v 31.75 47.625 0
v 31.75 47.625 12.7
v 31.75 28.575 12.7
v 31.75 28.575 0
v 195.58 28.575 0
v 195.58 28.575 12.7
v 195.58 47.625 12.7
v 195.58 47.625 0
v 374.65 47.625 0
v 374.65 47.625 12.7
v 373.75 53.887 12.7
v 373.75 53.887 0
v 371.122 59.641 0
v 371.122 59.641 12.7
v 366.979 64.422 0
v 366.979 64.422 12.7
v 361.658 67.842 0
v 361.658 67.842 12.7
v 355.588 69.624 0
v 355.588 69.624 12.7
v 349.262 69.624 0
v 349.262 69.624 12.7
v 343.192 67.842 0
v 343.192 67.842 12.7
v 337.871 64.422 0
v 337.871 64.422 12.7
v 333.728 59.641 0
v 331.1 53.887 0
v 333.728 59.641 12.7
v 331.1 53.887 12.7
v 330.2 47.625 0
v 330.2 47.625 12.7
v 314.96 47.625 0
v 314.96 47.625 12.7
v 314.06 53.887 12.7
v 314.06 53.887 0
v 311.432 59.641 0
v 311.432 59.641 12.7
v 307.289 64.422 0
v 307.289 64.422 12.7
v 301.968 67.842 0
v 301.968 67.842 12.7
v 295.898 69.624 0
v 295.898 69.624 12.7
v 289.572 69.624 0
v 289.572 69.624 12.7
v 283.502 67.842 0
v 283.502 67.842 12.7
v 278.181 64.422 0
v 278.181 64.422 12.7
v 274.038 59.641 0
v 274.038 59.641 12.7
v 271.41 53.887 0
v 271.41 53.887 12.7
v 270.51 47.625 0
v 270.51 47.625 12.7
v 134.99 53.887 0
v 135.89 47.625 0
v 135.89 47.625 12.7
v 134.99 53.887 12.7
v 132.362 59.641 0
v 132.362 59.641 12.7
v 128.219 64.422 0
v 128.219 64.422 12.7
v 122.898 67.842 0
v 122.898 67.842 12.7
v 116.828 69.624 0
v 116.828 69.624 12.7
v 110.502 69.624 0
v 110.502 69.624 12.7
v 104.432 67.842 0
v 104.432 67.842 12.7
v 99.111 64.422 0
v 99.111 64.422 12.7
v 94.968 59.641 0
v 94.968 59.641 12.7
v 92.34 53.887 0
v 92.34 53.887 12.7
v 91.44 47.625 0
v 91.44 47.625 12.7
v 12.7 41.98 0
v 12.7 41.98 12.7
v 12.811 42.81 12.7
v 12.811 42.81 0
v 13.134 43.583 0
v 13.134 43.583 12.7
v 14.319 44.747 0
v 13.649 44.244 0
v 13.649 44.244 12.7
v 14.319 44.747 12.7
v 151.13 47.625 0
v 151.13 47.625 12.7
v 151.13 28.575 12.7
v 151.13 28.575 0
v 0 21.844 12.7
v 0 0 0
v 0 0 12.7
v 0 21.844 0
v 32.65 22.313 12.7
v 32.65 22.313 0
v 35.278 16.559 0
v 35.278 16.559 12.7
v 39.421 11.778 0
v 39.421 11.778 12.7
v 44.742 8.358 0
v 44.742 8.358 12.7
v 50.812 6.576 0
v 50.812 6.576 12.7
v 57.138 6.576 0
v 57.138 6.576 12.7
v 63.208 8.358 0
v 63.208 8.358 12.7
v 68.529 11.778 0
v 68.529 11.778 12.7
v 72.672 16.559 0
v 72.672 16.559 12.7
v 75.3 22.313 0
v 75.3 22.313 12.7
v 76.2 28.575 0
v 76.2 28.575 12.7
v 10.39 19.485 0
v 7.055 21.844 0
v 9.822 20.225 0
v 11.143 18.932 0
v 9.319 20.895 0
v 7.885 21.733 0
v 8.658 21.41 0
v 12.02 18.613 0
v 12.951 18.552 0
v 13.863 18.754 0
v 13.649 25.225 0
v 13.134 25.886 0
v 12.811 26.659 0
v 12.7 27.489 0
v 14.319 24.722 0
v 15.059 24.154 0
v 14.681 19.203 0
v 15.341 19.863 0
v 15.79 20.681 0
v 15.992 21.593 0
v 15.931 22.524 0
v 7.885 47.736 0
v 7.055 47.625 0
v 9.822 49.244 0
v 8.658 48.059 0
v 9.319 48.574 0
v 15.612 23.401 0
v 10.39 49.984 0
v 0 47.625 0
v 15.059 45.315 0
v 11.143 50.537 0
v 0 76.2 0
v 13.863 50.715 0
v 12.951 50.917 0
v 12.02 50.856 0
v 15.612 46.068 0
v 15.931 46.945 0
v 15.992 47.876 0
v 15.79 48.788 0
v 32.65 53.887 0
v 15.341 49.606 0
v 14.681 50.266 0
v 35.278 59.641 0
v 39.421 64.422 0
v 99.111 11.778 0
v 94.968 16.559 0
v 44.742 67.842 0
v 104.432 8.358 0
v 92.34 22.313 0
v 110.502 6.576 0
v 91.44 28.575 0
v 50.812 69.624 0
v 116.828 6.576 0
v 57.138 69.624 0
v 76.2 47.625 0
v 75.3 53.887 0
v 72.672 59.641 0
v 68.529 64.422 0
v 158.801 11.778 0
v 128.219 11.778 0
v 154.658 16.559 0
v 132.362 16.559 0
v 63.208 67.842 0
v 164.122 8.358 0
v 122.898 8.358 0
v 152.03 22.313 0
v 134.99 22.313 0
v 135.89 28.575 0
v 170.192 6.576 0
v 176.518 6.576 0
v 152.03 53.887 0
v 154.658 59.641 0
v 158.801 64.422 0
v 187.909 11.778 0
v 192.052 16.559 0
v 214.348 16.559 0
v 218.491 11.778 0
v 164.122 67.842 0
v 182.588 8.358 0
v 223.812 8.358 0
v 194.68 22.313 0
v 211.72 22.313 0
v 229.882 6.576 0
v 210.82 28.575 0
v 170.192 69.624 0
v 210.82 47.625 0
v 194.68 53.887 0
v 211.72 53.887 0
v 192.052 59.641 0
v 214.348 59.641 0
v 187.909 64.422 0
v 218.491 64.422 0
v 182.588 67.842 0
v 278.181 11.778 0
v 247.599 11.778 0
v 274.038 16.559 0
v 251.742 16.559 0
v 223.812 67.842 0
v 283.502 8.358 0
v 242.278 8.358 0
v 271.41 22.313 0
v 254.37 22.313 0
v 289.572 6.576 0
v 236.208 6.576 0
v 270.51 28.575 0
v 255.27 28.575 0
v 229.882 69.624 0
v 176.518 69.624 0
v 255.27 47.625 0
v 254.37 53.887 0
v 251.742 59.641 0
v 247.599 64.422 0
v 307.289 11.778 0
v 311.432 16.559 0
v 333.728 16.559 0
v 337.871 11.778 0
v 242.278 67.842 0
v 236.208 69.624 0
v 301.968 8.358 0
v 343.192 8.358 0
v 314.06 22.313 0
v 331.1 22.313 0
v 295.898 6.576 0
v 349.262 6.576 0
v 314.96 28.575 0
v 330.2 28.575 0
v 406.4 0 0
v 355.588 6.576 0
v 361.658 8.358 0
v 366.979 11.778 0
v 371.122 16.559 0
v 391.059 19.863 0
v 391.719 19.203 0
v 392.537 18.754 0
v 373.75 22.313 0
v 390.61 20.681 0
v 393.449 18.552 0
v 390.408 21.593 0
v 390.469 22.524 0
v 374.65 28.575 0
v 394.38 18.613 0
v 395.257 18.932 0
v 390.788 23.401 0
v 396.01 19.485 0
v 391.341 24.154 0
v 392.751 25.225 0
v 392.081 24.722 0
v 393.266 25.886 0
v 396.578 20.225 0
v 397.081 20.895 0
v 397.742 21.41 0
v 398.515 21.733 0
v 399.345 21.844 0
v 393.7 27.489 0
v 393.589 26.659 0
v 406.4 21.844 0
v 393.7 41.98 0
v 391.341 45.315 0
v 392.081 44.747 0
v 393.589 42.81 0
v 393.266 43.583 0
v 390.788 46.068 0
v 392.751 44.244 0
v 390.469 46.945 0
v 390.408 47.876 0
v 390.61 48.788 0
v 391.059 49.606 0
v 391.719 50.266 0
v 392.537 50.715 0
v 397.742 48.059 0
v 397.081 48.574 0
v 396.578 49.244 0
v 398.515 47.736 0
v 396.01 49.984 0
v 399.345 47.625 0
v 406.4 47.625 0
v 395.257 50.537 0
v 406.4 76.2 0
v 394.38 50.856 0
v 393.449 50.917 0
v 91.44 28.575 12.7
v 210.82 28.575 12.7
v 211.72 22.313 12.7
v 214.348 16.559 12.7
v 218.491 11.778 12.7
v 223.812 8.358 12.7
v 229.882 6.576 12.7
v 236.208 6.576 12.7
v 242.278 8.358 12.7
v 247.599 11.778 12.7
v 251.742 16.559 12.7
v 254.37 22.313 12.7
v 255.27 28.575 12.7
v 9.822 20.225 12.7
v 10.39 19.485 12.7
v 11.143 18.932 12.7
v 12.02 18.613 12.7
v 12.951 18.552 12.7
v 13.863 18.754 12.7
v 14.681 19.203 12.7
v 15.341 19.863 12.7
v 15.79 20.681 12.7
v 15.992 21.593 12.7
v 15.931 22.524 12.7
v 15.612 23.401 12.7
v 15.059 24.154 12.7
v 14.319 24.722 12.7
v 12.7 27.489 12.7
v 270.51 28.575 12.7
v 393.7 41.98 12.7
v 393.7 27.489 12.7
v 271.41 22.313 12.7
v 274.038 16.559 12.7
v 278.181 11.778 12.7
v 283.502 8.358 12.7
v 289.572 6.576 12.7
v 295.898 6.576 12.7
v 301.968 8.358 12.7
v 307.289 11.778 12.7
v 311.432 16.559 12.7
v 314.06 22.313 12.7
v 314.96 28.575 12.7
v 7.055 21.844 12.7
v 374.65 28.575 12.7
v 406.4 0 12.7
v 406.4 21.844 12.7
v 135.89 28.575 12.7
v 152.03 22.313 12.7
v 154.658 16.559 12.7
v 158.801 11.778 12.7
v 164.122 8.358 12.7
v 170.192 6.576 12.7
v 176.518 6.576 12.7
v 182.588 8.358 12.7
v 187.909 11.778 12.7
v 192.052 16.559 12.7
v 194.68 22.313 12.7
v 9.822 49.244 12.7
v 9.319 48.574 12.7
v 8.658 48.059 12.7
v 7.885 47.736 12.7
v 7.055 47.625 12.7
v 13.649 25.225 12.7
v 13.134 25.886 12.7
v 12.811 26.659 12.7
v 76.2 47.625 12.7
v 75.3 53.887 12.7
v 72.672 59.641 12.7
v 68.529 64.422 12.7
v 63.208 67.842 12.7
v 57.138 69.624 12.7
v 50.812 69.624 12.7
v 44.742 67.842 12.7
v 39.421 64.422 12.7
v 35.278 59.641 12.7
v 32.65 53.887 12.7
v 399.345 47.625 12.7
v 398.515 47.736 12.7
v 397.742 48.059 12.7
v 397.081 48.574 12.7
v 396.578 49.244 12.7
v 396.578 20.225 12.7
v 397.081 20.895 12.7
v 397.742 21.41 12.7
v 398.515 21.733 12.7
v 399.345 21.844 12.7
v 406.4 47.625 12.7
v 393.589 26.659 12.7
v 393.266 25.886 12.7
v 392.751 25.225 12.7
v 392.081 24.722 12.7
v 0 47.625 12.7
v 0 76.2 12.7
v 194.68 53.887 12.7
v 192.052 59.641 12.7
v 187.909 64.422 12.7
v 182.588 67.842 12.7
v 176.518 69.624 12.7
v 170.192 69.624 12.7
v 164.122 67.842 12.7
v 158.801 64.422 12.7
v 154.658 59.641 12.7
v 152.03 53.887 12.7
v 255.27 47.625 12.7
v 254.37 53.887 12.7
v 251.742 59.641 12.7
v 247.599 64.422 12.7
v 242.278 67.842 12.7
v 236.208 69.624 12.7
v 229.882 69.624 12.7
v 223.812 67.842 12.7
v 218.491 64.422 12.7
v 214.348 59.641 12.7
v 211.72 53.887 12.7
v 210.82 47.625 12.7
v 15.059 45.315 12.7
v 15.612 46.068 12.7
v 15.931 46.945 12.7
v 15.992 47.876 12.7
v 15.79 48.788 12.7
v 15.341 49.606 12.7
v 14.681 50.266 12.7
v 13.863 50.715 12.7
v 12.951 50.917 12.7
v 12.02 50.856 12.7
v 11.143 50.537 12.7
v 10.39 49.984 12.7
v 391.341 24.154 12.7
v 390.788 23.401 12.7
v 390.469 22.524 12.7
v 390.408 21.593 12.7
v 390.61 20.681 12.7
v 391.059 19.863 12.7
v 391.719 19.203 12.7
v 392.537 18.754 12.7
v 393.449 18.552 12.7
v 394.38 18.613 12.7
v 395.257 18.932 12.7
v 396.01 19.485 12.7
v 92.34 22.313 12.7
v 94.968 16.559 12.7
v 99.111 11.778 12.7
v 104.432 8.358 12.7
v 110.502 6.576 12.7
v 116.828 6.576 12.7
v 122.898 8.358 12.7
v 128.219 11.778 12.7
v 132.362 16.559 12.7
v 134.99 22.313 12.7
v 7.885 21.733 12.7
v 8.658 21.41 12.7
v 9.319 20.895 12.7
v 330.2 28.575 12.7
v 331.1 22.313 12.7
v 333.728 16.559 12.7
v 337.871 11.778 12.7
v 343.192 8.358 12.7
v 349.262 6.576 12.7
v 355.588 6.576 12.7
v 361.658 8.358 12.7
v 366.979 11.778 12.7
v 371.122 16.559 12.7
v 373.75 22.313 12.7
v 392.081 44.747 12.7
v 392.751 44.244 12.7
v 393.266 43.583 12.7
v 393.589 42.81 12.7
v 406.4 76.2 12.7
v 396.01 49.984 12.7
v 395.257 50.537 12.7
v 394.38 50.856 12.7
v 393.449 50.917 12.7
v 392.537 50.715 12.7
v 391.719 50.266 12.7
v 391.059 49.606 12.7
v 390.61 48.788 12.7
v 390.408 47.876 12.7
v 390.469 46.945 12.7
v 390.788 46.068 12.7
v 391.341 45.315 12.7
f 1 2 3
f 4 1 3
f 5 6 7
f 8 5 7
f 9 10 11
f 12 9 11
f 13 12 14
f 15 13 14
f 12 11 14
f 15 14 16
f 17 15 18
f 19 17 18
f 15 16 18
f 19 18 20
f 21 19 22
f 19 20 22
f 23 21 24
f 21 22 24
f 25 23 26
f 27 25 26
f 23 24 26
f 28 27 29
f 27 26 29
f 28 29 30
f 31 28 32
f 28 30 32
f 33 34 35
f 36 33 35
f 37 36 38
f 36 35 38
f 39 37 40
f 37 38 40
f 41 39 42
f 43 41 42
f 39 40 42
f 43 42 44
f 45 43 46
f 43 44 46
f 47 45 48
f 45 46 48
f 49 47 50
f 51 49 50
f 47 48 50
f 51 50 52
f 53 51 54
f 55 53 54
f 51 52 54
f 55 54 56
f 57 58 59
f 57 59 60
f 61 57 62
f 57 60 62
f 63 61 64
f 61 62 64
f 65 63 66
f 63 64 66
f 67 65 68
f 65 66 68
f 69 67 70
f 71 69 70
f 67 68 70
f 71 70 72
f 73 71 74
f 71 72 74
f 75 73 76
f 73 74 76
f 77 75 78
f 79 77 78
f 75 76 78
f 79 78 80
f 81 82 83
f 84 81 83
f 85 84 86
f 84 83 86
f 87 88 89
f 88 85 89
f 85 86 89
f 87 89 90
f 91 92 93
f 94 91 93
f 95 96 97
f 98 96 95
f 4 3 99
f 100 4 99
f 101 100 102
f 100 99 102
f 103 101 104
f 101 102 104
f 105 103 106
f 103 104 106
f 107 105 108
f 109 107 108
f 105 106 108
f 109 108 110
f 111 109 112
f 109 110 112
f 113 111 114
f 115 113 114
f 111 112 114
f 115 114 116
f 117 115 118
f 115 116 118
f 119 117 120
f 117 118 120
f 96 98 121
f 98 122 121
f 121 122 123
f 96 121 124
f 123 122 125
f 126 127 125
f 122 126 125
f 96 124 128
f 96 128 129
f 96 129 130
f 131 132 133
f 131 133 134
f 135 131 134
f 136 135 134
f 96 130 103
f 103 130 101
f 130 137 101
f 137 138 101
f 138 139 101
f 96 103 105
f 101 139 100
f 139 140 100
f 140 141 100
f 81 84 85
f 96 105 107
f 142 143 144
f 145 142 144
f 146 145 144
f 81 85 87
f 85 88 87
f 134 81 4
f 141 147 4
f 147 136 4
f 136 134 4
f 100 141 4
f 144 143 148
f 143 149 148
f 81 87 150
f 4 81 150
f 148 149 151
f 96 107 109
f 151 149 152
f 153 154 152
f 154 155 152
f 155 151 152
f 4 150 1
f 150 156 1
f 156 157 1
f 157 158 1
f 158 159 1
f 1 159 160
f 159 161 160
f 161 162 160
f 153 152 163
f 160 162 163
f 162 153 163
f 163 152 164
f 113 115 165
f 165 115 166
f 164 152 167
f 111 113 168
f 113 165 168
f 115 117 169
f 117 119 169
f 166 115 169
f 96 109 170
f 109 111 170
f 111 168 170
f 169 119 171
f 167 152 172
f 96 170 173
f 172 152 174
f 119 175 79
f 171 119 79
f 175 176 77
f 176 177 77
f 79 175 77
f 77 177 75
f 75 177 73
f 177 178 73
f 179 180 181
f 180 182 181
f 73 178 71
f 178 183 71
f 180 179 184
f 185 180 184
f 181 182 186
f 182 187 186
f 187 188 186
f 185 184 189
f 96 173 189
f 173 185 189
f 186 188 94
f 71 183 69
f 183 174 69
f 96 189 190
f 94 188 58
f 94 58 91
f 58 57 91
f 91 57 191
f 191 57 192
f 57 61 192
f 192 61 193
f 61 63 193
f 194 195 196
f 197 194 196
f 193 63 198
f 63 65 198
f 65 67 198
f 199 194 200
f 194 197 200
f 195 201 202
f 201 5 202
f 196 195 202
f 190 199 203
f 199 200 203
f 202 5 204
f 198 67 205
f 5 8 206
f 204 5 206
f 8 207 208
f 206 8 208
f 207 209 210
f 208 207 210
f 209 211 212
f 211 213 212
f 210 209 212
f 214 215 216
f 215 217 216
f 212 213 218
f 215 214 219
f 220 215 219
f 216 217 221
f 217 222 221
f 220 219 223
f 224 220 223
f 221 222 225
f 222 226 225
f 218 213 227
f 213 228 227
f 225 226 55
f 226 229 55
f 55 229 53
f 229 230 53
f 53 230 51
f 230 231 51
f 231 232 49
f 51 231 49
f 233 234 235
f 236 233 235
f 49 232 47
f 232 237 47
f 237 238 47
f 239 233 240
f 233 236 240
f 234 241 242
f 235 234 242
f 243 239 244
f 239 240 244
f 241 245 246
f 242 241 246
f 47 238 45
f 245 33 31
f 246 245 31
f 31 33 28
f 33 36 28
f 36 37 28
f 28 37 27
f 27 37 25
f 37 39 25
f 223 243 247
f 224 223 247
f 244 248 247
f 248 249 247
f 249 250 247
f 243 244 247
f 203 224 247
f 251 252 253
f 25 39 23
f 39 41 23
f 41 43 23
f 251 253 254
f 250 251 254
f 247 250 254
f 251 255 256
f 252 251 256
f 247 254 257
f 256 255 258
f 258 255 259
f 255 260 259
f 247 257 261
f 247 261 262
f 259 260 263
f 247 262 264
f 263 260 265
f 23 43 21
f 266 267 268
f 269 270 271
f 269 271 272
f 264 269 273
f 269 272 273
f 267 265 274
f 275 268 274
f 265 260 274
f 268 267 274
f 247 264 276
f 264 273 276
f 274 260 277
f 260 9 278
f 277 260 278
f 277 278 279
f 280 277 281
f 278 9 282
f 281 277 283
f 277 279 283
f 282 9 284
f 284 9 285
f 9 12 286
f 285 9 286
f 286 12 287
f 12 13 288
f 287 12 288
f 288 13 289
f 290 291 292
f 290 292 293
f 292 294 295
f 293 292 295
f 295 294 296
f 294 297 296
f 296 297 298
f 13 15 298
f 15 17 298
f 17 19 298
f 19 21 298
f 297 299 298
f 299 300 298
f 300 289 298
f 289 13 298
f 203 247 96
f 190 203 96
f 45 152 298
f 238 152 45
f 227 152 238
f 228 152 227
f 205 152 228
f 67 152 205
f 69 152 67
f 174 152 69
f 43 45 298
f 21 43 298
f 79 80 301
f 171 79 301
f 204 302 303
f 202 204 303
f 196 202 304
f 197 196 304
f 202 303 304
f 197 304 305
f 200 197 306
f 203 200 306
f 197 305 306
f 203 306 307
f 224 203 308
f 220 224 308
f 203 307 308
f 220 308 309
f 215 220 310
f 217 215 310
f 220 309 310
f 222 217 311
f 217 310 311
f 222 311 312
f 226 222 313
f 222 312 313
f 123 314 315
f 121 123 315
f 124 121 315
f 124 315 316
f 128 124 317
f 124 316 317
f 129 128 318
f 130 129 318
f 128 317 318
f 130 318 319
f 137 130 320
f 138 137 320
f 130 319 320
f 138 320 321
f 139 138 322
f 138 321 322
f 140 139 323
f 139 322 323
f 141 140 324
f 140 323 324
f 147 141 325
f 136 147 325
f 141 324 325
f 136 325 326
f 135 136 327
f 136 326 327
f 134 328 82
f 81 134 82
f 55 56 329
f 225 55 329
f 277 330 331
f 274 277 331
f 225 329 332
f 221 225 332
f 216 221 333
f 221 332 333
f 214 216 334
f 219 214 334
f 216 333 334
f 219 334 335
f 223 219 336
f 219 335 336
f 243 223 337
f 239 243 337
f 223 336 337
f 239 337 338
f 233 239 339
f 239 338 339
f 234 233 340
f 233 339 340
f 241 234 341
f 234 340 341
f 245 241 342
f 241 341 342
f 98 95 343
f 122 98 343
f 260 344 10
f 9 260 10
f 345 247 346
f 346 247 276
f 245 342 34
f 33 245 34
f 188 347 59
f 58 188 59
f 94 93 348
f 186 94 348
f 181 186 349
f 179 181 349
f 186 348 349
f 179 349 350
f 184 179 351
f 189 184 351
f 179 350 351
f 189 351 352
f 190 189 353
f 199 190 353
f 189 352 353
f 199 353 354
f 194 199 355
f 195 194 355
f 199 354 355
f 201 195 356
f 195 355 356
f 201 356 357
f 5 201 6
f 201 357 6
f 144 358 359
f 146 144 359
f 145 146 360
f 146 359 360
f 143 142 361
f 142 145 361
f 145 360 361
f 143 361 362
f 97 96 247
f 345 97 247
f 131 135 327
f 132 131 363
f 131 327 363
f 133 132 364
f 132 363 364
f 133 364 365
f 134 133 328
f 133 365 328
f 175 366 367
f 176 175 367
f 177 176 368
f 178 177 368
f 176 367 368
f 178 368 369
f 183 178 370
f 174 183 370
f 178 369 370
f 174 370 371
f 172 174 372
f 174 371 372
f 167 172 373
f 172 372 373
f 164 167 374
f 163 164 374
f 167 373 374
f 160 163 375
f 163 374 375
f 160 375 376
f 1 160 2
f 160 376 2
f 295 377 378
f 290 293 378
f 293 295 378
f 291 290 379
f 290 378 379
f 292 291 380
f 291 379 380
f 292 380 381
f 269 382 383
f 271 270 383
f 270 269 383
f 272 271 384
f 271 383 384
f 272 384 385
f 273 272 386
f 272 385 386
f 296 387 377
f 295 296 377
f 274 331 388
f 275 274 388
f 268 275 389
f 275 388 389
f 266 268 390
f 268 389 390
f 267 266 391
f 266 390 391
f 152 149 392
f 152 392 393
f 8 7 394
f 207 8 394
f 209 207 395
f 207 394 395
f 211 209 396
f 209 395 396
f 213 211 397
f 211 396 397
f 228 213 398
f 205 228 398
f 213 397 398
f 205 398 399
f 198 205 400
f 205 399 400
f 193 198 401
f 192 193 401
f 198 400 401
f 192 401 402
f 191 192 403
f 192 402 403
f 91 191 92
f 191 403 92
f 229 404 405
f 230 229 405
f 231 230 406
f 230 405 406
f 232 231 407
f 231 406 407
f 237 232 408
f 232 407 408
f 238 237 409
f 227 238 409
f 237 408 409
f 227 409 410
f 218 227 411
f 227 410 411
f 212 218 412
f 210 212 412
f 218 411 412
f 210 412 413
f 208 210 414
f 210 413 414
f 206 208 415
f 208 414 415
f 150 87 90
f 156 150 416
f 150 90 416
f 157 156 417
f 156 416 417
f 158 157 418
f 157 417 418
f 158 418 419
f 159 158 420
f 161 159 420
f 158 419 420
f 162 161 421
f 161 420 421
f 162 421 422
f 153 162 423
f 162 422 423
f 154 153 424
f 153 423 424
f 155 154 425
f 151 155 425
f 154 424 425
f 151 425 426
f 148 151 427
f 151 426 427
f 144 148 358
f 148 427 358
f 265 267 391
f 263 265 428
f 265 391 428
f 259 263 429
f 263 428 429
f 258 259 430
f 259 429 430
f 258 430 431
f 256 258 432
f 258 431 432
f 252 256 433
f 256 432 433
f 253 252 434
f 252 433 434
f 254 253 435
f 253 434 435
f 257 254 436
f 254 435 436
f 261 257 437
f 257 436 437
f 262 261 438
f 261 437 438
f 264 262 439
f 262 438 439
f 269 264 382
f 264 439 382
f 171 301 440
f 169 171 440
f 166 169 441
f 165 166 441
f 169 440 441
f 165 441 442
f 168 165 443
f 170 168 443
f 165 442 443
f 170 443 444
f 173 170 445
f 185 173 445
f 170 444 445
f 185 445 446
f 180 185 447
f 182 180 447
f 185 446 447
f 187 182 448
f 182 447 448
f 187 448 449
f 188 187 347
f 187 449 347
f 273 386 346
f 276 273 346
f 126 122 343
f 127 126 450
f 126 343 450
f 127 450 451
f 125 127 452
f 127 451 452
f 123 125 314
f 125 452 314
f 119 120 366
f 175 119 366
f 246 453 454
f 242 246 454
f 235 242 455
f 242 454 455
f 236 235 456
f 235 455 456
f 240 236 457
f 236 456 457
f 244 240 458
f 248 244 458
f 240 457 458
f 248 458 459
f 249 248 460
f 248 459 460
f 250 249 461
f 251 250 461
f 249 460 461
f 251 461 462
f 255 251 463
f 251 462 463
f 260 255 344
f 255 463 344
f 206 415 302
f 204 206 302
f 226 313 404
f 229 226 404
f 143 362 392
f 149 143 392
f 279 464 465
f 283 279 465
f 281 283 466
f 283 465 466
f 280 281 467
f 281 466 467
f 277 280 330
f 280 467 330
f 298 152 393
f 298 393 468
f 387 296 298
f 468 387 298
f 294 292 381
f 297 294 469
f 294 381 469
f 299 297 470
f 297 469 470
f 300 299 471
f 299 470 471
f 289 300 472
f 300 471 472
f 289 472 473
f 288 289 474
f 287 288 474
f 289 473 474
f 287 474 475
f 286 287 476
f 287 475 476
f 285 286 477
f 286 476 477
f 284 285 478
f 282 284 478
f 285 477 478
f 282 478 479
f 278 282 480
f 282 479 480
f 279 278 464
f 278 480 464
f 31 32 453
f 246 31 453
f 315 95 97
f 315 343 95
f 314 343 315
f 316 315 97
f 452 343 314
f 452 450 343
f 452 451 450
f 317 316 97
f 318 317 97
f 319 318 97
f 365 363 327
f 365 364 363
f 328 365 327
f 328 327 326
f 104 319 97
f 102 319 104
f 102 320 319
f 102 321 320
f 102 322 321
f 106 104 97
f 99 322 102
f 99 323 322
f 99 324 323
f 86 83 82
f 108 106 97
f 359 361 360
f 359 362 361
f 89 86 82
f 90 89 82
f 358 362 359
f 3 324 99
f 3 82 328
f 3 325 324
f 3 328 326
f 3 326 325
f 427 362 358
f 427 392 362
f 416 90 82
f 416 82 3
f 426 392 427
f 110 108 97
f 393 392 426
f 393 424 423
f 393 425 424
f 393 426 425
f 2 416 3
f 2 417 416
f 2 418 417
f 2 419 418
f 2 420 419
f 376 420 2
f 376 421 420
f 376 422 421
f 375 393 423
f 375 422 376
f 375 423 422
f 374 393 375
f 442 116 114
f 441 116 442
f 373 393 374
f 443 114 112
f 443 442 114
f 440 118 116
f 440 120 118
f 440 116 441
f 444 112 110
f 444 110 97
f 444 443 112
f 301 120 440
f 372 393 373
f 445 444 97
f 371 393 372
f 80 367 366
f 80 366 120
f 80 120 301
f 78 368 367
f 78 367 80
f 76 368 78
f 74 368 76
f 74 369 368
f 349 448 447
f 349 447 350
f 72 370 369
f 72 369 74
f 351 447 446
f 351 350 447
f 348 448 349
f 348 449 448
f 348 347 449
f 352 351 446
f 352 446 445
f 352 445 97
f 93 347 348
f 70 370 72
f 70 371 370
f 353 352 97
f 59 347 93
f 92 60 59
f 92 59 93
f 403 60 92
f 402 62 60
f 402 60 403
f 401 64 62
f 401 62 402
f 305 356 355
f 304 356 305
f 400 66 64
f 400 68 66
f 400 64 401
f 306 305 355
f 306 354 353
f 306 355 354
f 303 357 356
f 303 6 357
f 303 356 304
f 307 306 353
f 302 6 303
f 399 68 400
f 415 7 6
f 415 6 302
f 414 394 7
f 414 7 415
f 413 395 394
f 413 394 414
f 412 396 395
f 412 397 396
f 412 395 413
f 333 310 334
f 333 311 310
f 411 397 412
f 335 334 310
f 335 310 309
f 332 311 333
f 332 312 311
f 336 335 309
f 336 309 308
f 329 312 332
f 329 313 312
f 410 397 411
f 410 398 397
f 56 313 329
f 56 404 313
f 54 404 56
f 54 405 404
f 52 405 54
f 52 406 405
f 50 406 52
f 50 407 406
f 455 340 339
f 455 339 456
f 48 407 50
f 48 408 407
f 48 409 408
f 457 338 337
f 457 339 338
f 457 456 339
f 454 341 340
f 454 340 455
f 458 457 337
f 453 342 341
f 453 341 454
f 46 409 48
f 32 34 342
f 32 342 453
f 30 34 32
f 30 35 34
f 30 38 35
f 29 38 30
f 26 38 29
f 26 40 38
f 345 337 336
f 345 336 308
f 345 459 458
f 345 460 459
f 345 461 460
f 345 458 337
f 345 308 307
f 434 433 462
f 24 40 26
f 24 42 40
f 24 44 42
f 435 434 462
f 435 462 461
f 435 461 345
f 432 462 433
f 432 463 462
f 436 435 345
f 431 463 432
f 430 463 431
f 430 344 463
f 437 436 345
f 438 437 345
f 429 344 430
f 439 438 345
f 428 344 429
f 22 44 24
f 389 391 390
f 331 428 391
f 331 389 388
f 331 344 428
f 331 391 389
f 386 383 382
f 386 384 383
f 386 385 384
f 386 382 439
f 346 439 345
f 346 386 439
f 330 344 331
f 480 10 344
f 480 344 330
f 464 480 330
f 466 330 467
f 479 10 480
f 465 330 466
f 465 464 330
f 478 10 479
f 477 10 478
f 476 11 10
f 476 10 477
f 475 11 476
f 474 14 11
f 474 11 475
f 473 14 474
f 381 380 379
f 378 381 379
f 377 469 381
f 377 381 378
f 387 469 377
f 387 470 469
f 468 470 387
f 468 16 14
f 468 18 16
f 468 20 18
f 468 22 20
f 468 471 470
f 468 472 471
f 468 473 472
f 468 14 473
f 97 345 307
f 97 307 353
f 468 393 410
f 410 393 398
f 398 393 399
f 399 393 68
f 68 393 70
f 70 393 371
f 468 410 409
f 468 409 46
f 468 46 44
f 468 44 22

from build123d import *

# Parameters (mm, degrees)
F0_W     = 406.4
F0_H     = 76.2
F1_DEPTH = 12.7
F3_DEPTH = 25.4
F5_DEPTH = 25.4


with BuildPart() as f1:
    # F0 (on Top) → F1 (new body)
    with BuildSketch(Plane.XY):
        with Locations((203.2, 38.1)):
            Rectangle(F0_W, F0_H)
    extrude(amount=F1_DEPTH)

    # F2 (on face) → F3 (cut)
    with BuildSketch(Plane.XY.offset(12.7)):
        with BuildLine():
            Line((7.054568, 47.625), (0, 47.625))
            Line((0, 47.625), (0, 21.844))
            Line((0, 21.844), (7.054568, 21.844))
            ThreePointArc((7.054568, 21.844), (8.657556, 21.40963), (9.821937, 20.225373))
            ThreePointArc((9.821937, 20.225373), (15.034867, 19.509133), (14.318627, 24.722063))
            ThreePointArc((14.318627, 24.722063), (13.13437, 25.886444), (12.7, 27.489432))
            Line((12.7, 27.489432), (12.7, 41.979568))
            ThreePointArc((12.7, 41.979568), (13.13437, 43.582556), (14.318627, 44.746937))
            ThreePointArc((14.318627, 44.746937), (15.034867, 49.959867), (9.821937, 49.243627))
            ThreePointArc((9.821937, 49.243627), (8.657556, 48.05937), (7.054568, 47.625))
        make_face()
        with BuildLine():
            Line((393.7, 41.979568), (393.7, 27.489432))
            ThreePointArc((393.7, 27.489432), (393.26563, 25.886444), (392.081373, 24.722063))
            ThreePointArc((392.081373, 24.722063), (391.365133, 19.509133), (396.578063, 20.225373))
            ThreePointArc((396.578063, 20.225373), (397.742444, 21.40963), (399.345432, 21.844))
            Line((399.345432, 21.844), (406.4, 21.844))
            Line((406.4, 21.844), (406.4, 47.625))
            Line((406.4, 47.625), (399.345432, 47.625))
            ThreePointArc((399.345432, 47.625), (397.742444, 48.05937), (396.578063, 49.243627))
            ThreePointArc((396.578063, 49.243627), (391.365133, 49.959867), (392.081373, 44.746937))
            ThreePointArc((392.081373, 44.746937), (393.26563, 43.582556), (393.7, 41.979568))
        make_face()
    extrude(amount=-F3_DEPTH, mode=Mode.SUBTRACT)

    # F4 (on face) → F5 (cut)
    with BuildSketch(Plane.XY.offset(12.7)):
        with BuildLine():
            ThreePointArc((31.75, 28.575), (53.975, 6.35), (76.2, 28.575))
            Line((76.2, 28.575), (76.2, 47.625))
            ThreePointArc((76.2, 47.625), (53.975, 69.85), (31.75, 47.625))
            Line((31.75, 47.625), (31.75, 28.575))
        make_face()
        with BuildLine():
            Line((91.44, 47.625), (91.44, 28.575))
            ThreePointArc((91.44, 28.575), (113.665, 6.35), (135.89, 28.575))
            Line((135.89, 28.575), (135.89, 47.625))
            ThreePointArc((135.89, 47.625), (113.665, 69.85), (91.44, 47.625))
        make_face()
        with BuildLine():
            Line((151.13, 47.625), (151.13, 28.575))
            ThreePointArc((151.13, 28.575), (173.355, 6.35), (195.58, 28.575))
            Line((195.58, 28.575), (195.58, 47.625))
            ThreePointArc((195.58, 47.625), (173.355, 69.85), (151.13, 47.625))
        make_face()
        with BuildLine():
            Line((210.82, 47.625), (210.82, 28.575))
            ThreePointArc((210.82, 28.575), (233.045, 6.35), (255.27, 28.575))
            Line((255.27, 28.575), (255.27, 47.625))
            ThreePointArc((255.27, 47.625), (233.045, 69.85), (210.82, 47.625))
        make_face()
        with BuildLine():
            Line((270.51, 47.625), (270.51, 28.575))
            ThreePointArc((270.51, 28.575), (292.735, 6.35), (314.96, 28.575))
            Line((314.96, 28.575), (314.96, 47.625))
            ThreePointArc((314.96, 47.625), (292.735, 69.85), (270.51, 47.625))
        make_face()
        with BuildLine():
            Line((330.2, 47.625), (330.2, 28.575))
            ThreePointArc((330.2, 28.575), (352.425, 6.35), (374.65, 28.575))
            Line((374.65, 28.575), (374.65, 47.625))
            ThreePointArc((374.65, 47.625), (352.425, 69.85), (330.2, 47.625))
        make_face()
    extrude(amount=-F5_DEPTH, mode=Mode.SUBTRACT)


solid = f1.part
